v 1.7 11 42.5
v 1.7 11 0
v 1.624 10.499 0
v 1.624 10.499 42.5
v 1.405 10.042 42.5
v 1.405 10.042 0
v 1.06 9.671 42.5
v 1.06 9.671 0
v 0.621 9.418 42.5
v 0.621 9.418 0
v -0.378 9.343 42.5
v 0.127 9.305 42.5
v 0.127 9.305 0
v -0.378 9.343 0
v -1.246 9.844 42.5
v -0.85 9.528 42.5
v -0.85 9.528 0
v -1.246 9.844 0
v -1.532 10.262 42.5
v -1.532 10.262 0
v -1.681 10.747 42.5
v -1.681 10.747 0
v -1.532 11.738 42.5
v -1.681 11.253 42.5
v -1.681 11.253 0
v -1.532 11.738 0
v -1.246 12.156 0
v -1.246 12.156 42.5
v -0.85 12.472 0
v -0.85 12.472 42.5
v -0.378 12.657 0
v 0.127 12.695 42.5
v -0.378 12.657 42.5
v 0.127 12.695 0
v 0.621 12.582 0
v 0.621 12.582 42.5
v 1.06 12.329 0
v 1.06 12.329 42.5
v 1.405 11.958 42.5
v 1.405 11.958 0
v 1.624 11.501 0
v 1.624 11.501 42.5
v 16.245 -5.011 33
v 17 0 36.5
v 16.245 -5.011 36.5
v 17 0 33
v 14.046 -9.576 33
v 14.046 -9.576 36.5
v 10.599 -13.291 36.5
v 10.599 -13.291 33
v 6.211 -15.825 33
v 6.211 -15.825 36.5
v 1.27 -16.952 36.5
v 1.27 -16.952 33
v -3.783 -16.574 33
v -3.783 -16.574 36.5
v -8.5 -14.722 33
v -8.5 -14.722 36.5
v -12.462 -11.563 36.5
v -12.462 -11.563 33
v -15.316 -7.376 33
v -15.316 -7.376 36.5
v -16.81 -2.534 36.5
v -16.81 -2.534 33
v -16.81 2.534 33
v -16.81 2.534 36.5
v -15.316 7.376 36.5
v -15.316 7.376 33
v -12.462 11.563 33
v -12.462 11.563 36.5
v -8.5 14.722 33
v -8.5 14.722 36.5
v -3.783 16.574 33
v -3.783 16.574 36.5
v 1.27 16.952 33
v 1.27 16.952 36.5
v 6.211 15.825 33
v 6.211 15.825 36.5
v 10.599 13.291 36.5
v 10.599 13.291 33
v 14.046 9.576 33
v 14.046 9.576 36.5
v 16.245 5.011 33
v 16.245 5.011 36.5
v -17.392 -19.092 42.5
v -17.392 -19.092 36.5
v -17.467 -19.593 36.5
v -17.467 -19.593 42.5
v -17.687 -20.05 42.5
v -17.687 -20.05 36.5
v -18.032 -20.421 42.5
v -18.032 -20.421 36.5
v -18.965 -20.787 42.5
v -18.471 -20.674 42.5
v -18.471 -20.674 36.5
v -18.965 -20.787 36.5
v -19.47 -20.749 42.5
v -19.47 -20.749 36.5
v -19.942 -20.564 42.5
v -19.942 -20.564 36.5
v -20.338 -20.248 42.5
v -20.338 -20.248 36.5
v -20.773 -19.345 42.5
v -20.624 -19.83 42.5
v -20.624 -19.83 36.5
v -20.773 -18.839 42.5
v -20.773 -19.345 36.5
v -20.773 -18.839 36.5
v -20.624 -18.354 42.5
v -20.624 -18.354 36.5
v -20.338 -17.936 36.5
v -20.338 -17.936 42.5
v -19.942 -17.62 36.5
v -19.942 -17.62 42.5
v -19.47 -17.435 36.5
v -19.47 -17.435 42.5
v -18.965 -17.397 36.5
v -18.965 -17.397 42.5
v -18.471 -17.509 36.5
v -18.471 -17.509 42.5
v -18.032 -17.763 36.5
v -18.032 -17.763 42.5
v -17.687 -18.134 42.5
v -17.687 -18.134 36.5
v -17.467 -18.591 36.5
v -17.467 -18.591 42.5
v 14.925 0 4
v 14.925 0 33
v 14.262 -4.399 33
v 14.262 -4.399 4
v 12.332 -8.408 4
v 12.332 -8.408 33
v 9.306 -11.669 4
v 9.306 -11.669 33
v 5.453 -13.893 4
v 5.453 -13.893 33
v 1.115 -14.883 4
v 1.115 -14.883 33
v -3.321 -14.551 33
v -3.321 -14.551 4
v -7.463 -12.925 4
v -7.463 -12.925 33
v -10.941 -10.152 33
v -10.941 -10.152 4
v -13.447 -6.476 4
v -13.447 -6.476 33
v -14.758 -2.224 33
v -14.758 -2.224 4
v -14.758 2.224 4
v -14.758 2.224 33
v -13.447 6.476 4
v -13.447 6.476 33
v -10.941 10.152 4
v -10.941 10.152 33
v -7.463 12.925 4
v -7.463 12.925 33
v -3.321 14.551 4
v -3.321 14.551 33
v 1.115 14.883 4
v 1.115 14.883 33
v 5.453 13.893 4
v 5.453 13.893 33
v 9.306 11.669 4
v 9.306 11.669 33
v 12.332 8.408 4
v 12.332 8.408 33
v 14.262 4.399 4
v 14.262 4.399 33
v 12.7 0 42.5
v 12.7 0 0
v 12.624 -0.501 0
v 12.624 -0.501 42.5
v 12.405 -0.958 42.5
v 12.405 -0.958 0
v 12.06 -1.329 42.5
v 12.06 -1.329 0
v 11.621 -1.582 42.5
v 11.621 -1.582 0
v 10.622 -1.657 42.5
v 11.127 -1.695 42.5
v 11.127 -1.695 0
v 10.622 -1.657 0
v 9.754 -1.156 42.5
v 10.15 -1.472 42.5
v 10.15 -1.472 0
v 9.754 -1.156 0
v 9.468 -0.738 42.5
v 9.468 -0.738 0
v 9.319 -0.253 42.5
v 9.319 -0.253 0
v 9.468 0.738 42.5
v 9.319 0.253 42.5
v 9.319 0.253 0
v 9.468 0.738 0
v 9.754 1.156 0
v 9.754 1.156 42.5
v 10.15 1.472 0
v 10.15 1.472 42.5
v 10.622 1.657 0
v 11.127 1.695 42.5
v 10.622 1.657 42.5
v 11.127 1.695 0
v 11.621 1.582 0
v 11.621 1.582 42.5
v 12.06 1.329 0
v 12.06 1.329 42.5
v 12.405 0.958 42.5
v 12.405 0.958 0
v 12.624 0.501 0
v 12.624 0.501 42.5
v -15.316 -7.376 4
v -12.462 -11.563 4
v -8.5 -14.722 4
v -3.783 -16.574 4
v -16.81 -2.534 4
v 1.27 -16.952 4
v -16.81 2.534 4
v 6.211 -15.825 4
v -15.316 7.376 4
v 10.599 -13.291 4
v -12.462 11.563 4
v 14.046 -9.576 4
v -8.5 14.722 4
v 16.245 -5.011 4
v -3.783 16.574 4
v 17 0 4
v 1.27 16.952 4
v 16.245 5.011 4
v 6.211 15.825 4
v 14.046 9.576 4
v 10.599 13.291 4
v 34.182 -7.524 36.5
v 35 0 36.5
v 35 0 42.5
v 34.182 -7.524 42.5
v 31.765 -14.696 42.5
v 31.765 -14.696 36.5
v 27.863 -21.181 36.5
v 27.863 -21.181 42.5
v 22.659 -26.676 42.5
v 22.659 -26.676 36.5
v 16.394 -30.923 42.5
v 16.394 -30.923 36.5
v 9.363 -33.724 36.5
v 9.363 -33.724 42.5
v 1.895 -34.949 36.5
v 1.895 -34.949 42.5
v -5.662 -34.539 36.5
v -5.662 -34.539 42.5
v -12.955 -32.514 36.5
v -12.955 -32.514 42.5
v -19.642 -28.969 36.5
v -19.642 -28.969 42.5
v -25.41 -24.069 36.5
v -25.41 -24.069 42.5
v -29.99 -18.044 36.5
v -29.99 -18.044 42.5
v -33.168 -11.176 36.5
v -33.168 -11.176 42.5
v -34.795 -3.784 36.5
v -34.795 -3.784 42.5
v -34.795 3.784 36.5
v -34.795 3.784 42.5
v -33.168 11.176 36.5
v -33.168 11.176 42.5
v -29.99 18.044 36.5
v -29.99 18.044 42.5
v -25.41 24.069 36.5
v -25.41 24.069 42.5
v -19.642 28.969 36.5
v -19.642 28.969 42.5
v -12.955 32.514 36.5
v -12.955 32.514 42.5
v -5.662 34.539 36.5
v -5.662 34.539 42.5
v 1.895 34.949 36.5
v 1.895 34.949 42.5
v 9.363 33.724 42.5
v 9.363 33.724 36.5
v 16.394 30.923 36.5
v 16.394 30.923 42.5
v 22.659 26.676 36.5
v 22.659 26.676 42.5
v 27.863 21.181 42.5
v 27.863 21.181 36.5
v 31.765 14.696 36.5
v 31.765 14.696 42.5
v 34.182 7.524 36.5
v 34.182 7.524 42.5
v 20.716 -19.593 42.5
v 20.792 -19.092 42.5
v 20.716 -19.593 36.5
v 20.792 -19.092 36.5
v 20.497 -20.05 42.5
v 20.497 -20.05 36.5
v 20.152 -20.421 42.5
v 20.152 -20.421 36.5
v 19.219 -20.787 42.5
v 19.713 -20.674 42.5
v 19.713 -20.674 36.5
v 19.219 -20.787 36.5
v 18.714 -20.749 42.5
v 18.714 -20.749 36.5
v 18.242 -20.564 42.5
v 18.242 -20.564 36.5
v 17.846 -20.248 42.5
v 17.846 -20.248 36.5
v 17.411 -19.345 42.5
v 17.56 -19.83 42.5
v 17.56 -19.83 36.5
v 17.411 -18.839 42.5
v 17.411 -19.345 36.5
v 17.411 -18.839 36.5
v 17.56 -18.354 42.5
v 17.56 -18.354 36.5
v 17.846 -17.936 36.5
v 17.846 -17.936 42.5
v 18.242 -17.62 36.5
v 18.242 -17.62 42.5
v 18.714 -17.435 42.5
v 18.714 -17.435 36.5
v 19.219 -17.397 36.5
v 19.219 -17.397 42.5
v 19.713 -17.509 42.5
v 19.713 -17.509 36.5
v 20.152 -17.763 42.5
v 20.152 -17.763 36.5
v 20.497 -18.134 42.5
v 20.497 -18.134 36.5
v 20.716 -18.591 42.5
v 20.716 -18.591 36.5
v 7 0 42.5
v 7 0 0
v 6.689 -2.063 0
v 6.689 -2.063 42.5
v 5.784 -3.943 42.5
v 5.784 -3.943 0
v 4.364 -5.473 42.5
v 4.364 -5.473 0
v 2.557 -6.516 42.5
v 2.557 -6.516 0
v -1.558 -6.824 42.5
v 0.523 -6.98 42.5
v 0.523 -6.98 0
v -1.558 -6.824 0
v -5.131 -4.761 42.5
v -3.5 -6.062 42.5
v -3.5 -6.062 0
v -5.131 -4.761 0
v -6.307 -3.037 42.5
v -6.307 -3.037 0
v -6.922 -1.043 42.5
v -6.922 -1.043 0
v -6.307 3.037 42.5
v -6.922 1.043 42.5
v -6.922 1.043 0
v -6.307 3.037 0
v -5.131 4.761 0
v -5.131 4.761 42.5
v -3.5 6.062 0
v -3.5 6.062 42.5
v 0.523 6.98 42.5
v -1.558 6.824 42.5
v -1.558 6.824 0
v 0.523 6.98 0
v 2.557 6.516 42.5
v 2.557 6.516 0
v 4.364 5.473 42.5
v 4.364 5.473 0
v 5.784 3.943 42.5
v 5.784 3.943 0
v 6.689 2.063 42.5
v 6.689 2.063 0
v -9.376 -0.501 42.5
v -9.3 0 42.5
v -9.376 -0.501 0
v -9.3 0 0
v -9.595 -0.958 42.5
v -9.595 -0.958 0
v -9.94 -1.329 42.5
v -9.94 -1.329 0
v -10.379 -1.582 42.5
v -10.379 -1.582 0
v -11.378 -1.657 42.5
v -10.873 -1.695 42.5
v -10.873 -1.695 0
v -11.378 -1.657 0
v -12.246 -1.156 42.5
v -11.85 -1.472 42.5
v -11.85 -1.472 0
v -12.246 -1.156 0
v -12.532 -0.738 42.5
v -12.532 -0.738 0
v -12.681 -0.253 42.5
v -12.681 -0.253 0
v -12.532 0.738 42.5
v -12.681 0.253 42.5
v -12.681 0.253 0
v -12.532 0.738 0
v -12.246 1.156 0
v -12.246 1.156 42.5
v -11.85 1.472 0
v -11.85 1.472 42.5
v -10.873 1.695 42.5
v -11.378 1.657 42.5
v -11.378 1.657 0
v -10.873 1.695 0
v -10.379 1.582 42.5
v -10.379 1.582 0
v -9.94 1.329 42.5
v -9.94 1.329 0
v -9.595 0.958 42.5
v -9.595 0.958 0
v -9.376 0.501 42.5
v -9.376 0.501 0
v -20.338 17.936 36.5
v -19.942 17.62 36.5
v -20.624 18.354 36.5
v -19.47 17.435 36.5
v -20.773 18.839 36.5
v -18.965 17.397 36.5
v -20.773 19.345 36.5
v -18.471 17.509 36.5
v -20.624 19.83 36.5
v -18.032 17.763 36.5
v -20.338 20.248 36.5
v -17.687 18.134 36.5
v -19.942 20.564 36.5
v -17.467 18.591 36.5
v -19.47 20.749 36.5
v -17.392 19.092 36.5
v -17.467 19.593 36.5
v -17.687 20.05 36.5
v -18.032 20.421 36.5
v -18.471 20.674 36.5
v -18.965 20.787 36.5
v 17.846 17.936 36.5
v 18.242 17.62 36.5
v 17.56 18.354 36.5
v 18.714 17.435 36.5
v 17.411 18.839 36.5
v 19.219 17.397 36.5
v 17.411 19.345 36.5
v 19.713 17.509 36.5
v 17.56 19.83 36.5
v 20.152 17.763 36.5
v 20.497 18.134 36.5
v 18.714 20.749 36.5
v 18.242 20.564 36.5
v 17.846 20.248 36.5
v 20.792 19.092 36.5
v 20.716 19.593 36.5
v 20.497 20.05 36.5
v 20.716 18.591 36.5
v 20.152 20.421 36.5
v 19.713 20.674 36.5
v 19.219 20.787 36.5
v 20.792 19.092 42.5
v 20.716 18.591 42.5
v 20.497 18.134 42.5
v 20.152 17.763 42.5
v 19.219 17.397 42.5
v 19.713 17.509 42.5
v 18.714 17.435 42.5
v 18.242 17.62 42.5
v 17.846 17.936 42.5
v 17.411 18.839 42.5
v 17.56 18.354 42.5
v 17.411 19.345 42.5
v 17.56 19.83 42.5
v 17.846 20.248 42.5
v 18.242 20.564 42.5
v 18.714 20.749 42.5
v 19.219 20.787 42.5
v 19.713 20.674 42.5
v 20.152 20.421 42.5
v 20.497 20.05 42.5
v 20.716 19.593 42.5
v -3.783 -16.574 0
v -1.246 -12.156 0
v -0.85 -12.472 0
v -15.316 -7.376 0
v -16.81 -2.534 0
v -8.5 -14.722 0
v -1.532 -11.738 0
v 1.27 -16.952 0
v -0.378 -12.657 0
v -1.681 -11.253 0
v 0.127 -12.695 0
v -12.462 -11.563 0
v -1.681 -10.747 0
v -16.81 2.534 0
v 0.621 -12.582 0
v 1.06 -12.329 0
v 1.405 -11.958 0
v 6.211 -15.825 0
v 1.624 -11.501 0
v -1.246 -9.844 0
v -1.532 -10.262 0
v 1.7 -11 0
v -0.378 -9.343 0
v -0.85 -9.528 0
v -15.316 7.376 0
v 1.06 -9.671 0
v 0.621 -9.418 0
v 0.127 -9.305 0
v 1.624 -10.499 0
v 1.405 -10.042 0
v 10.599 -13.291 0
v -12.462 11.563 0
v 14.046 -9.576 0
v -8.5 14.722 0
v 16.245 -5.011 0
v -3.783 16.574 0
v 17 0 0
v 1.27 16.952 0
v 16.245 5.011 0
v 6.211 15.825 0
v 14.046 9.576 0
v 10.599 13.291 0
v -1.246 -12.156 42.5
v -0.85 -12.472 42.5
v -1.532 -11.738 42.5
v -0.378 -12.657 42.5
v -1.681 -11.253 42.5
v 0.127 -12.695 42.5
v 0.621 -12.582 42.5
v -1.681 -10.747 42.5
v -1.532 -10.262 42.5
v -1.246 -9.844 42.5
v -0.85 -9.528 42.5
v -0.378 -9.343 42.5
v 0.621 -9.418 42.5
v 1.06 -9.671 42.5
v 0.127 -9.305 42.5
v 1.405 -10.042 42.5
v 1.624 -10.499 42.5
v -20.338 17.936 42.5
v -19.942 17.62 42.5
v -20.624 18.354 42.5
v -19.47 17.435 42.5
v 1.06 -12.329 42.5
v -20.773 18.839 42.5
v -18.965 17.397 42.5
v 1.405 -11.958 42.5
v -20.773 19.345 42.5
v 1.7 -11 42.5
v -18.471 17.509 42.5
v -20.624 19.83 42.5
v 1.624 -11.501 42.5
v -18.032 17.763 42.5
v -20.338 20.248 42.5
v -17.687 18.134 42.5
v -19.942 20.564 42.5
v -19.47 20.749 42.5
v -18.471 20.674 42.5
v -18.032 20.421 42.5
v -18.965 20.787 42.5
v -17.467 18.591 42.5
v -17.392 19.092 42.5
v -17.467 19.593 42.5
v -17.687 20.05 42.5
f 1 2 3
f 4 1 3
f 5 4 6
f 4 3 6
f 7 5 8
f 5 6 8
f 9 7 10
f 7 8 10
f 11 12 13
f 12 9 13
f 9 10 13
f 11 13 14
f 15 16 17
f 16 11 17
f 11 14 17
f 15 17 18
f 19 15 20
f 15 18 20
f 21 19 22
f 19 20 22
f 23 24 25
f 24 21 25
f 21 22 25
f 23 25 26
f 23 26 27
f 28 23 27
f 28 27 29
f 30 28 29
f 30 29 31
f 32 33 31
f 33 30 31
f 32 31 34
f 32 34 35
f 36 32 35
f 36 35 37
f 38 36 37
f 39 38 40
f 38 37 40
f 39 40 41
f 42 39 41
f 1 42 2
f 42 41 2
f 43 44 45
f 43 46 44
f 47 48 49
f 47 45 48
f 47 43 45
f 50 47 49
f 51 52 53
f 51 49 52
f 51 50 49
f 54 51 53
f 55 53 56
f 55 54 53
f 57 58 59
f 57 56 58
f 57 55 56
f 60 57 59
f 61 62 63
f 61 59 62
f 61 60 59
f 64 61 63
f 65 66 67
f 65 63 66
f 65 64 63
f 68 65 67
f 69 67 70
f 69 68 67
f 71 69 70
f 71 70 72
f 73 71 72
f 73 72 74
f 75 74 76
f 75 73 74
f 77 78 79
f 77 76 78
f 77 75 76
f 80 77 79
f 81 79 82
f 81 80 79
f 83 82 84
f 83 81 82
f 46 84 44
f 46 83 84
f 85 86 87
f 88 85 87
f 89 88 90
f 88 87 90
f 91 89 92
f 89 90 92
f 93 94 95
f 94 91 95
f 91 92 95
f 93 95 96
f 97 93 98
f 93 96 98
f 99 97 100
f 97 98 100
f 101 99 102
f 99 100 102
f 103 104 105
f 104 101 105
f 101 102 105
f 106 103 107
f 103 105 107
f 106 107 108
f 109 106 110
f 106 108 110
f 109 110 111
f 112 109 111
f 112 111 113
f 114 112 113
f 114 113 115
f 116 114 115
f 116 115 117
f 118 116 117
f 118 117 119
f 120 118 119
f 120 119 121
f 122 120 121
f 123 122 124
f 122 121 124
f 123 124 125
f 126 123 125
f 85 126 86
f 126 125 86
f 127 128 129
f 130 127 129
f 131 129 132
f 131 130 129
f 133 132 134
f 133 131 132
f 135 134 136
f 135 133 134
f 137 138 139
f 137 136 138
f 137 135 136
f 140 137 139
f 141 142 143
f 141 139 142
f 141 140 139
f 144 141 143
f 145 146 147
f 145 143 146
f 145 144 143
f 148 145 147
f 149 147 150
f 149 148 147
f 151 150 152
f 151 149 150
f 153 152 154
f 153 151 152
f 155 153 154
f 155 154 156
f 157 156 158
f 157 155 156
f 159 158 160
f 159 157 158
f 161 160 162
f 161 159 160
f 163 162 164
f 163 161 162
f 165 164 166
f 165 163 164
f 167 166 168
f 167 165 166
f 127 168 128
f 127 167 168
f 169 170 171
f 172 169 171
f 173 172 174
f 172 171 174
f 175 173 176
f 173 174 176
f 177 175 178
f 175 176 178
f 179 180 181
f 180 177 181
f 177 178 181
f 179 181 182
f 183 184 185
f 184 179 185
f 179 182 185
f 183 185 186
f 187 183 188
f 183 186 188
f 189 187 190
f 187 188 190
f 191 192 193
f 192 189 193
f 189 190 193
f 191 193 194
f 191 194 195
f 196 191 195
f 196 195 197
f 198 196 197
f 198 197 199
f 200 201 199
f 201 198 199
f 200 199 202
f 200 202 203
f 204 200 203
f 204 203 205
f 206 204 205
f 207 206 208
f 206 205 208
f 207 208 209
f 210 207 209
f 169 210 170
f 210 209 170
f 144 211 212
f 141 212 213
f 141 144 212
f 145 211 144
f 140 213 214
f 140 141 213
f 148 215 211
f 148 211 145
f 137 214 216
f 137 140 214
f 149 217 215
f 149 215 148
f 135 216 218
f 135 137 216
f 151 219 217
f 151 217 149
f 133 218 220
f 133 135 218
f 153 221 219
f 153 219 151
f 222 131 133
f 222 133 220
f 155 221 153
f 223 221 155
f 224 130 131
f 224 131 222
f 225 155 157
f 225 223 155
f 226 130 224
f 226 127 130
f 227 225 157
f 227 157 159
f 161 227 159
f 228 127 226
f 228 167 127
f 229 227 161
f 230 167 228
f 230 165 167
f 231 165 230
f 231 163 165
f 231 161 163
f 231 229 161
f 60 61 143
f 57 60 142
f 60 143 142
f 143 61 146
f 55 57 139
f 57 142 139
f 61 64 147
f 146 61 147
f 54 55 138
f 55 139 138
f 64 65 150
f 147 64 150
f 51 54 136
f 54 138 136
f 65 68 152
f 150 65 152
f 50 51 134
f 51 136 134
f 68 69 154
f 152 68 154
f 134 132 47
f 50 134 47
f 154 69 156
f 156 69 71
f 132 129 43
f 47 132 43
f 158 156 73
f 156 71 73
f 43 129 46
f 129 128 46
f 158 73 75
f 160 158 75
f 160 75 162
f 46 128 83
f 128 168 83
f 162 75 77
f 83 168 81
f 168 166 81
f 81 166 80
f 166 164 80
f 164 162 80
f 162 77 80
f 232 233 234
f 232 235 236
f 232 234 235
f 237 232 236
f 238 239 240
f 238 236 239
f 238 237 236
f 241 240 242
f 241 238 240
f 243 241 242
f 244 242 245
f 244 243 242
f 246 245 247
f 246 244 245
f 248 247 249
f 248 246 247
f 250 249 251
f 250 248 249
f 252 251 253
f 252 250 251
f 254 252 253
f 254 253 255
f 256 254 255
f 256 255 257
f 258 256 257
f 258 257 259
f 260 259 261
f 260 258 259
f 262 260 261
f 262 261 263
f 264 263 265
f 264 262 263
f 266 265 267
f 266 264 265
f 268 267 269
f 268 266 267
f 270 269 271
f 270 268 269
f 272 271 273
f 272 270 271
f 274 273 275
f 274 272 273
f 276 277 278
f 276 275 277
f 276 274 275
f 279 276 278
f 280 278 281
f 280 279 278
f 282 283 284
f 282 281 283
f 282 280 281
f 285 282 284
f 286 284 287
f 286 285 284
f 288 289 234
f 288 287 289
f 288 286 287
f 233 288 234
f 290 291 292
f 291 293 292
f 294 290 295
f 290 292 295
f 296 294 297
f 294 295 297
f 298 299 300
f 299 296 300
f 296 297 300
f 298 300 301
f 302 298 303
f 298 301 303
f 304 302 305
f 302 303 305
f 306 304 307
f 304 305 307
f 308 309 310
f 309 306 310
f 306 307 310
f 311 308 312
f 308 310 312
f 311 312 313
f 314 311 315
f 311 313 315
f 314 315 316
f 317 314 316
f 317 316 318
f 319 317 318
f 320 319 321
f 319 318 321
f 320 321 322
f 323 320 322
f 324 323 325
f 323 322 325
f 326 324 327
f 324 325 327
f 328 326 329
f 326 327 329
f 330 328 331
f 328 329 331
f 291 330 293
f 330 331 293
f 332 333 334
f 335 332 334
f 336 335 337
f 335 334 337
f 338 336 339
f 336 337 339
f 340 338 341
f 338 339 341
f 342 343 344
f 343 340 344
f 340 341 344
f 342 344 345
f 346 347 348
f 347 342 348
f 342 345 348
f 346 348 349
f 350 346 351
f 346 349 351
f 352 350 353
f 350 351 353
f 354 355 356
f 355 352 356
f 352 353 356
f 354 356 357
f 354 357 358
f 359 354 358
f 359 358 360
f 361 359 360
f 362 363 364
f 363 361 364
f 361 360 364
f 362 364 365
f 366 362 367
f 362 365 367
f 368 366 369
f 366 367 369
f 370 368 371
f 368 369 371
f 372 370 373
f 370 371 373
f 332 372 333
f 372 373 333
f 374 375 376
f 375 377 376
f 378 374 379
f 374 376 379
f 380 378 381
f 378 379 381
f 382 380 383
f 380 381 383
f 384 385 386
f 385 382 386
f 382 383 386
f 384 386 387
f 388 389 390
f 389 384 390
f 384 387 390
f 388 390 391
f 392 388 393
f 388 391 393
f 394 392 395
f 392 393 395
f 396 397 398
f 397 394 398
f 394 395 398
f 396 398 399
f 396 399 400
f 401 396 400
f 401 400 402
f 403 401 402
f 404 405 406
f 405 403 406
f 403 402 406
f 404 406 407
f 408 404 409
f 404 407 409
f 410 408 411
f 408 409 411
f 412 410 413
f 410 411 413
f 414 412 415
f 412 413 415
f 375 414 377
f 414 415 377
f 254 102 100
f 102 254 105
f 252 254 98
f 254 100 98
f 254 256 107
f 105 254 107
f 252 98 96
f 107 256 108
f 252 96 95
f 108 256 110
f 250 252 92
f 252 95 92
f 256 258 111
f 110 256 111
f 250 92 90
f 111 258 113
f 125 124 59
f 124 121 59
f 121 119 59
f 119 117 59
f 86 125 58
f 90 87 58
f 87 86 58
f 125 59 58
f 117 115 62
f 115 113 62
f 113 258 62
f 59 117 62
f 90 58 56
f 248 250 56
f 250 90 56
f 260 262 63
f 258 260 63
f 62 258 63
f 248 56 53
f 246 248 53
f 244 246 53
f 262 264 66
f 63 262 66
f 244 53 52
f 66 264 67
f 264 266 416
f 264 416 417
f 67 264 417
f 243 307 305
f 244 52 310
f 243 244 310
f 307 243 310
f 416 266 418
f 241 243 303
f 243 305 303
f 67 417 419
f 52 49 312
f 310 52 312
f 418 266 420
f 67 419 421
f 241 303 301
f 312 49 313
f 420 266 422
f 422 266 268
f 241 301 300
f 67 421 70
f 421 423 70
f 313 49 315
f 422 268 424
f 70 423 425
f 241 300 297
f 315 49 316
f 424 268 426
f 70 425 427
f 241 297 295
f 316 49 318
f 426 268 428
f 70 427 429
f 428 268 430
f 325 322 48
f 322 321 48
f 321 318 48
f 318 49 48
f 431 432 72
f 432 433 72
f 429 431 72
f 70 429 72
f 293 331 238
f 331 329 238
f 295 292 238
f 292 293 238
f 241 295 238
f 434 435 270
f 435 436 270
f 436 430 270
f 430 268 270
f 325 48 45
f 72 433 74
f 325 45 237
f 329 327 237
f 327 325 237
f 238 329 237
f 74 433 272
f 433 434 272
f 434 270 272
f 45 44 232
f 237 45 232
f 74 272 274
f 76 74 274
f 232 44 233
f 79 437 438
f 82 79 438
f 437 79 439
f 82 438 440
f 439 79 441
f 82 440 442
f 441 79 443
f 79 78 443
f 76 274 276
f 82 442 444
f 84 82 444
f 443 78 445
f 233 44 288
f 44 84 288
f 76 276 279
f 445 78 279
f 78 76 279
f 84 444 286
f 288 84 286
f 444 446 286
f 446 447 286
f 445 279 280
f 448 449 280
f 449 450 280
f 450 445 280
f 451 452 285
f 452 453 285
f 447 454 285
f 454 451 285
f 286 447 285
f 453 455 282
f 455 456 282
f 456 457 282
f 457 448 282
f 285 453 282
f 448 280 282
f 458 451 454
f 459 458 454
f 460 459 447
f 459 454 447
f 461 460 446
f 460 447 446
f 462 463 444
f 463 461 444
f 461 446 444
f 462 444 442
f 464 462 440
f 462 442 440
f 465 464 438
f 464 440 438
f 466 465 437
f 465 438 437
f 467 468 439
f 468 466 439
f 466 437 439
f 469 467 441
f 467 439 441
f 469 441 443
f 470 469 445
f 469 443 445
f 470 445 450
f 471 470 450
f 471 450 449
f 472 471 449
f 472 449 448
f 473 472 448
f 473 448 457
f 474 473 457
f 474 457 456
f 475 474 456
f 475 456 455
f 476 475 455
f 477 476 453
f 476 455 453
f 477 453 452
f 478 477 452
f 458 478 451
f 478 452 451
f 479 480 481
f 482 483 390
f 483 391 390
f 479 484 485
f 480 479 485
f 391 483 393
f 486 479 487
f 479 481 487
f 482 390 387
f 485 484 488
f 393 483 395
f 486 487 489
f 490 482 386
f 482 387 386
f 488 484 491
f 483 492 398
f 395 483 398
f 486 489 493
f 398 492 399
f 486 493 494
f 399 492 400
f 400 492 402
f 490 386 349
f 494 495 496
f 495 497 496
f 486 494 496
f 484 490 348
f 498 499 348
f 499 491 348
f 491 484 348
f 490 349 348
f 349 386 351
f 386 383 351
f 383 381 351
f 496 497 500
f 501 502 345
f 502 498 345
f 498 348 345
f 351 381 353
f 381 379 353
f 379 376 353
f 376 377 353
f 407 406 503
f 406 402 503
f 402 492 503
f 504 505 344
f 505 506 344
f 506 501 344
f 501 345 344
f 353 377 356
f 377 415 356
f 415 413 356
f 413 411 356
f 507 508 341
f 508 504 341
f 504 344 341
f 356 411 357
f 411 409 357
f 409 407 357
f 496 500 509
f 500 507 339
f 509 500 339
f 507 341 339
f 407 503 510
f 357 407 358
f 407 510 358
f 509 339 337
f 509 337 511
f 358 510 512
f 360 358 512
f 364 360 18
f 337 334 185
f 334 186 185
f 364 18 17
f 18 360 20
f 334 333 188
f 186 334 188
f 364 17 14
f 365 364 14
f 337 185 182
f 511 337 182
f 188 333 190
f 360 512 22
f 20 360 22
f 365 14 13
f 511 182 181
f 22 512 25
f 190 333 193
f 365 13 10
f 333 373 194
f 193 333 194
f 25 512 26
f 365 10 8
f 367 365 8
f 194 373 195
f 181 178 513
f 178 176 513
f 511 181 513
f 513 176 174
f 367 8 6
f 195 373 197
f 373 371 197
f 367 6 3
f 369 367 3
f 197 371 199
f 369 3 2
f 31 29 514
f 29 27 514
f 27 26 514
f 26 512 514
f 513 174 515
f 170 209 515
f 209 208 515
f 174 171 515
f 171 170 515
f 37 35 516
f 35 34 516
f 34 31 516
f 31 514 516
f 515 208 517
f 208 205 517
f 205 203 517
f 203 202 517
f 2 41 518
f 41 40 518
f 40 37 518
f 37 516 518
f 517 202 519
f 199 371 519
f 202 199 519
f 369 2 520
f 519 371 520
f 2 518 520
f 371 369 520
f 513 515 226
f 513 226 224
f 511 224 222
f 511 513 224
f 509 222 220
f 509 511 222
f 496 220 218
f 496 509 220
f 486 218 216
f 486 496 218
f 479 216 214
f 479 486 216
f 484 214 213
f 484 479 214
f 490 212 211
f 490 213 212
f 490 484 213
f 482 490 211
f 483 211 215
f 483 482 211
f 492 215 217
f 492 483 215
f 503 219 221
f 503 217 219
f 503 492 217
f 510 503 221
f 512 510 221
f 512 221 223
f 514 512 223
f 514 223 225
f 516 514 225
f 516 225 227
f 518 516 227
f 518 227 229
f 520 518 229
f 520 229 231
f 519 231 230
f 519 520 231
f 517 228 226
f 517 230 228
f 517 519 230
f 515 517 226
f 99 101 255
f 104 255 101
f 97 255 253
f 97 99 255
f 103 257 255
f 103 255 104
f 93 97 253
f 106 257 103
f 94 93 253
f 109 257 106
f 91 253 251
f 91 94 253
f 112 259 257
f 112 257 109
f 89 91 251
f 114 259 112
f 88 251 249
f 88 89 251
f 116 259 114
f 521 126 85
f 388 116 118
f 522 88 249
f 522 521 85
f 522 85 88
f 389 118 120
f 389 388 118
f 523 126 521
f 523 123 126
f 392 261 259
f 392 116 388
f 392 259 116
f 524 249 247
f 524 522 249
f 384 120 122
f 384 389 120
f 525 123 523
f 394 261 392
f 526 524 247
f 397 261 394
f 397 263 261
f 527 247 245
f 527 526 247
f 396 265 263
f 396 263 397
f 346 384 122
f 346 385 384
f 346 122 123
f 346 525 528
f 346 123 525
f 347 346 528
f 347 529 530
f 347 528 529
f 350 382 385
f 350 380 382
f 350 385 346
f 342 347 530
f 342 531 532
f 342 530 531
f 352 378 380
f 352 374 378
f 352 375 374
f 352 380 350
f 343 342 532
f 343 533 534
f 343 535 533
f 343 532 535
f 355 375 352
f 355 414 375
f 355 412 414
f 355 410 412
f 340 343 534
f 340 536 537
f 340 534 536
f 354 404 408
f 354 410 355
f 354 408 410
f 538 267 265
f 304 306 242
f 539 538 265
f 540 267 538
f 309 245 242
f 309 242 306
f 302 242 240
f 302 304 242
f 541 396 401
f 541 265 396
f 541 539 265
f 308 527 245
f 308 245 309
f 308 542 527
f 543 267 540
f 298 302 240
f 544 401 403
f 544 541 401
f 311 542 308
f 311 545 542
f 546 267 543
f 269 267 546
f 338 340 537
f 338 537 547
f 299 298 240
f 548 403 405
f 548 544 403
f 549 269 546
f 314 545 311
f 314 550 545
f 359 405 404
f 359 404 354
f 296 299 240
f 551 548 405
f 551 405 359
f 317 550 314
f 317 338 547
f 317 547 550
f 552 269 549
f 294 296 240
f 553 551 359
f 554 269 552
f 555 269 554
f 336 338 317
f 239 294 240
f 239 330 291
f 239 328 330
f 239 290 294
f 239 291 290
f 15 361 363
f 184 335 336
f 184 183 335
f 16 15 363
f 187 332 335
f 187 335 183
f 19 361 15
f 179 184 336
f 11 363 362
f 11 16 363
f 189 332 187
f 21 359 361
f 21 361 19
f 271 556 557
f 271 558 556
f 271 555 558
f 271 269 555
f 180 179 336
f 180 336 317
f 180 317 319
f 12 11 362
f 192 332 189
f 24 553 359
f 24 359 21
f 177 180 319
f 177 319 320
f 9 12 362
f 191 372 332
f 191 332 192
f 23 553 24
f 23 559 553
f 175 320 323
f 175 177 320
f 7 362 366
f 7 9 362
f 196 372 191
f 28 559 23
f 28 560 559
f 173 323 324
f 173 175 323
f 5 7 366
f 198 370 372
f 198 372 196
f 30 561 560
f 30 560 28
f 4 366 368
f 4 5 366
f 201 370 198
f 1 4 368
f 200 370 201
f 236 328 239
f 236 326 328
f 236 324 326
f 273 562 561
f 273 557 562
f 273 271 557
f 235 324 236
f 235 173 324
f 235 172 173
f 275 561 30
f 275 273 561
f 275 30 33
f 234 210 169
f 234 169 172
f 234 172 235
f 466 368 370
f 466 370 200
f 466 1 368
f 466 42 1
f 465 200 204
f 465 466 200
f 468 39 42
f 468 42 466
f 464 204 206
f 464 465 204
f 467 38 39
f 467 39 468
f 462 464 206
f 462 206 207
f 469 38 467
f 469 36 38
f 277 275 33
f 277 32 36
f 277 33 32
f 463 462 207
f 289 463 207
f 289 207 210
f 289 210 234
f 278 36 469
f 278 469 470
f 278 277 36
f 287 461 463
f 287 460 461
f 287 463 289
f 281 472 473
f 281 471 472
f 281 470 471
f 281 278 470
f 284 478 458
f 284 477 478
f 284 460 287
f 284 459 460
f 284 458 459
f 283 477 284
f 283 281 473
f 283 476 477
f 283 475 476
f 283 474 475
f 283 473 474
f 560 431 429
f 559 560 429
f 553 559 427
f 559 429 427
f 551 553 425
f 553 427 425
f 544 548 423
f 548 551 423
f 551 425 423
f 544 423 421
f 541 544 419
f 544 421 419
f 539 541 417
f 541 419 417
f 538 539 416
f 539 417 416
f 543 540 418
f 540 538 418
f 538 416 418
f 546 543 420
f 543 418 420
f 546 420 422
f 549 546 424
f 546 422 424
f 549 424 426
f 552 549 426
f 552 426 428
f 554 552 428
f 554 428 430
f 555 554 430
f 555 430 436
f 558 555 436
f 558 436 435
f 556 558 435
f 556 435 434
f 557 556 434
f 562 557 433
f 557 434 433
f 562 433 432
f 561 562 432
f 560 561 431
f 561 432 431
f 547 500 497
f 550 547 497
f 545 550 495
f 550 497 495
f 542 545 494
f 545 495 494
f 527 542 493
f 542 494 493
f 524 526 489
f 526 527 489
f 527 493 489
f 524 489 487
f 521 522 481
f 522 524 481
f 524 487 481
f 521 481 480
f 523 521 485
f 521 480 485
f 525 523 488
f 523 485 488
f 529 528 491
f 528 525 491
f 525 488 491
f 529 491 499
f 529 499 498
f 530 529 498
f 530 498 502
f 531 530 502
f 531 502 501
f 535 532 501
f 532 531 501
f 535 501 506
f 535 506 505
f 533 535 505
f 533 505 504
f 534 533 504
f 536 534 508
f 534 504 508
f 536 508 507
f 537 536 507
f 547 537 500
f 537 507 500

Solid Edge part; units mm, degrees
sketch "Sketch1" plane through (0, 0, 0) normal (0, 0, 1) x (1, 0, 0)
  circle A0 centre (0, 0) radius 17
  circle A1 centre (0, 0) radius 7
  circle A2 centre (11, 0) radius 1.7
  circle A3 centre (0, 11) radius 1.7
  circle A4 centre (-11, 0) radius 1.7
  circle A5 centre (0, -11) radius 1.7
extrude "Protrusion1" add sketch "Sketch1" along normal blind 4
sketch "Sketch2" plane through (0, 0, 4) normal (0, 0, 1) x (1, 0, 0)
  circle A0 centre (0, 0) radius 14.925
  circle A1 centre (0, 0) radius 7
  circle A2 centre (11, 0) radius 1.7
  circle A3 centre (0, 11) radius 1.7
  circle A4 centre (-11, 0) radius 1.7
  circle A5 centre (0, -11) radius 1.7
extrude "ExtrudedProtrusion_2" add sketch "Sketch2" along normal blind 29
sketch "Sketch3" plane through (0, 0, 33) normal (0, 0, 1) x (1, 0, 0)
  circle A0 centre (0, 0) radius 17
  circle A1 centre (0, 0) radius 7
  circle A2 centre (11, 0) radius 1.7
  circle A3 centre (0, 11) radius 1.7
  circle A4 centre (-11, 0) radius 1.7
  circle A5 centre (0, -11) radius 1.7
extrude "ExtrudedProtrusion_3" add sketch "Sketch3" along normal blind 3.5
sketch "Sketch4" plane through (0, 0, 36.5) normal (0, 0, 1) x (1, 0, 0)
  circle A0 centre (0, 0) radius 35
  circle A1 centre (0, 0) radius 7
  circle A2 centre (11, 0) radius 1.7
  circle A3 centre (0, 11) radius 1.7
  circle A4 centre (-11, 0) radius 1.7
  circle A5 centre (0, -11) radius 1.7
  circle A6 centre (19.0919, 19.0919) radius 1.7
  circle A7 centre (-19.0919, 19.0919) radius 1.7
  circle A8 centre (-19.0919, -19.0919) radius 1.7
  circle A9 centre (19.0919, -19.0919) radius 1.7
extrude "ExtrudedProtrusion_4" add sketch "Sketch4" along normal blind 6
